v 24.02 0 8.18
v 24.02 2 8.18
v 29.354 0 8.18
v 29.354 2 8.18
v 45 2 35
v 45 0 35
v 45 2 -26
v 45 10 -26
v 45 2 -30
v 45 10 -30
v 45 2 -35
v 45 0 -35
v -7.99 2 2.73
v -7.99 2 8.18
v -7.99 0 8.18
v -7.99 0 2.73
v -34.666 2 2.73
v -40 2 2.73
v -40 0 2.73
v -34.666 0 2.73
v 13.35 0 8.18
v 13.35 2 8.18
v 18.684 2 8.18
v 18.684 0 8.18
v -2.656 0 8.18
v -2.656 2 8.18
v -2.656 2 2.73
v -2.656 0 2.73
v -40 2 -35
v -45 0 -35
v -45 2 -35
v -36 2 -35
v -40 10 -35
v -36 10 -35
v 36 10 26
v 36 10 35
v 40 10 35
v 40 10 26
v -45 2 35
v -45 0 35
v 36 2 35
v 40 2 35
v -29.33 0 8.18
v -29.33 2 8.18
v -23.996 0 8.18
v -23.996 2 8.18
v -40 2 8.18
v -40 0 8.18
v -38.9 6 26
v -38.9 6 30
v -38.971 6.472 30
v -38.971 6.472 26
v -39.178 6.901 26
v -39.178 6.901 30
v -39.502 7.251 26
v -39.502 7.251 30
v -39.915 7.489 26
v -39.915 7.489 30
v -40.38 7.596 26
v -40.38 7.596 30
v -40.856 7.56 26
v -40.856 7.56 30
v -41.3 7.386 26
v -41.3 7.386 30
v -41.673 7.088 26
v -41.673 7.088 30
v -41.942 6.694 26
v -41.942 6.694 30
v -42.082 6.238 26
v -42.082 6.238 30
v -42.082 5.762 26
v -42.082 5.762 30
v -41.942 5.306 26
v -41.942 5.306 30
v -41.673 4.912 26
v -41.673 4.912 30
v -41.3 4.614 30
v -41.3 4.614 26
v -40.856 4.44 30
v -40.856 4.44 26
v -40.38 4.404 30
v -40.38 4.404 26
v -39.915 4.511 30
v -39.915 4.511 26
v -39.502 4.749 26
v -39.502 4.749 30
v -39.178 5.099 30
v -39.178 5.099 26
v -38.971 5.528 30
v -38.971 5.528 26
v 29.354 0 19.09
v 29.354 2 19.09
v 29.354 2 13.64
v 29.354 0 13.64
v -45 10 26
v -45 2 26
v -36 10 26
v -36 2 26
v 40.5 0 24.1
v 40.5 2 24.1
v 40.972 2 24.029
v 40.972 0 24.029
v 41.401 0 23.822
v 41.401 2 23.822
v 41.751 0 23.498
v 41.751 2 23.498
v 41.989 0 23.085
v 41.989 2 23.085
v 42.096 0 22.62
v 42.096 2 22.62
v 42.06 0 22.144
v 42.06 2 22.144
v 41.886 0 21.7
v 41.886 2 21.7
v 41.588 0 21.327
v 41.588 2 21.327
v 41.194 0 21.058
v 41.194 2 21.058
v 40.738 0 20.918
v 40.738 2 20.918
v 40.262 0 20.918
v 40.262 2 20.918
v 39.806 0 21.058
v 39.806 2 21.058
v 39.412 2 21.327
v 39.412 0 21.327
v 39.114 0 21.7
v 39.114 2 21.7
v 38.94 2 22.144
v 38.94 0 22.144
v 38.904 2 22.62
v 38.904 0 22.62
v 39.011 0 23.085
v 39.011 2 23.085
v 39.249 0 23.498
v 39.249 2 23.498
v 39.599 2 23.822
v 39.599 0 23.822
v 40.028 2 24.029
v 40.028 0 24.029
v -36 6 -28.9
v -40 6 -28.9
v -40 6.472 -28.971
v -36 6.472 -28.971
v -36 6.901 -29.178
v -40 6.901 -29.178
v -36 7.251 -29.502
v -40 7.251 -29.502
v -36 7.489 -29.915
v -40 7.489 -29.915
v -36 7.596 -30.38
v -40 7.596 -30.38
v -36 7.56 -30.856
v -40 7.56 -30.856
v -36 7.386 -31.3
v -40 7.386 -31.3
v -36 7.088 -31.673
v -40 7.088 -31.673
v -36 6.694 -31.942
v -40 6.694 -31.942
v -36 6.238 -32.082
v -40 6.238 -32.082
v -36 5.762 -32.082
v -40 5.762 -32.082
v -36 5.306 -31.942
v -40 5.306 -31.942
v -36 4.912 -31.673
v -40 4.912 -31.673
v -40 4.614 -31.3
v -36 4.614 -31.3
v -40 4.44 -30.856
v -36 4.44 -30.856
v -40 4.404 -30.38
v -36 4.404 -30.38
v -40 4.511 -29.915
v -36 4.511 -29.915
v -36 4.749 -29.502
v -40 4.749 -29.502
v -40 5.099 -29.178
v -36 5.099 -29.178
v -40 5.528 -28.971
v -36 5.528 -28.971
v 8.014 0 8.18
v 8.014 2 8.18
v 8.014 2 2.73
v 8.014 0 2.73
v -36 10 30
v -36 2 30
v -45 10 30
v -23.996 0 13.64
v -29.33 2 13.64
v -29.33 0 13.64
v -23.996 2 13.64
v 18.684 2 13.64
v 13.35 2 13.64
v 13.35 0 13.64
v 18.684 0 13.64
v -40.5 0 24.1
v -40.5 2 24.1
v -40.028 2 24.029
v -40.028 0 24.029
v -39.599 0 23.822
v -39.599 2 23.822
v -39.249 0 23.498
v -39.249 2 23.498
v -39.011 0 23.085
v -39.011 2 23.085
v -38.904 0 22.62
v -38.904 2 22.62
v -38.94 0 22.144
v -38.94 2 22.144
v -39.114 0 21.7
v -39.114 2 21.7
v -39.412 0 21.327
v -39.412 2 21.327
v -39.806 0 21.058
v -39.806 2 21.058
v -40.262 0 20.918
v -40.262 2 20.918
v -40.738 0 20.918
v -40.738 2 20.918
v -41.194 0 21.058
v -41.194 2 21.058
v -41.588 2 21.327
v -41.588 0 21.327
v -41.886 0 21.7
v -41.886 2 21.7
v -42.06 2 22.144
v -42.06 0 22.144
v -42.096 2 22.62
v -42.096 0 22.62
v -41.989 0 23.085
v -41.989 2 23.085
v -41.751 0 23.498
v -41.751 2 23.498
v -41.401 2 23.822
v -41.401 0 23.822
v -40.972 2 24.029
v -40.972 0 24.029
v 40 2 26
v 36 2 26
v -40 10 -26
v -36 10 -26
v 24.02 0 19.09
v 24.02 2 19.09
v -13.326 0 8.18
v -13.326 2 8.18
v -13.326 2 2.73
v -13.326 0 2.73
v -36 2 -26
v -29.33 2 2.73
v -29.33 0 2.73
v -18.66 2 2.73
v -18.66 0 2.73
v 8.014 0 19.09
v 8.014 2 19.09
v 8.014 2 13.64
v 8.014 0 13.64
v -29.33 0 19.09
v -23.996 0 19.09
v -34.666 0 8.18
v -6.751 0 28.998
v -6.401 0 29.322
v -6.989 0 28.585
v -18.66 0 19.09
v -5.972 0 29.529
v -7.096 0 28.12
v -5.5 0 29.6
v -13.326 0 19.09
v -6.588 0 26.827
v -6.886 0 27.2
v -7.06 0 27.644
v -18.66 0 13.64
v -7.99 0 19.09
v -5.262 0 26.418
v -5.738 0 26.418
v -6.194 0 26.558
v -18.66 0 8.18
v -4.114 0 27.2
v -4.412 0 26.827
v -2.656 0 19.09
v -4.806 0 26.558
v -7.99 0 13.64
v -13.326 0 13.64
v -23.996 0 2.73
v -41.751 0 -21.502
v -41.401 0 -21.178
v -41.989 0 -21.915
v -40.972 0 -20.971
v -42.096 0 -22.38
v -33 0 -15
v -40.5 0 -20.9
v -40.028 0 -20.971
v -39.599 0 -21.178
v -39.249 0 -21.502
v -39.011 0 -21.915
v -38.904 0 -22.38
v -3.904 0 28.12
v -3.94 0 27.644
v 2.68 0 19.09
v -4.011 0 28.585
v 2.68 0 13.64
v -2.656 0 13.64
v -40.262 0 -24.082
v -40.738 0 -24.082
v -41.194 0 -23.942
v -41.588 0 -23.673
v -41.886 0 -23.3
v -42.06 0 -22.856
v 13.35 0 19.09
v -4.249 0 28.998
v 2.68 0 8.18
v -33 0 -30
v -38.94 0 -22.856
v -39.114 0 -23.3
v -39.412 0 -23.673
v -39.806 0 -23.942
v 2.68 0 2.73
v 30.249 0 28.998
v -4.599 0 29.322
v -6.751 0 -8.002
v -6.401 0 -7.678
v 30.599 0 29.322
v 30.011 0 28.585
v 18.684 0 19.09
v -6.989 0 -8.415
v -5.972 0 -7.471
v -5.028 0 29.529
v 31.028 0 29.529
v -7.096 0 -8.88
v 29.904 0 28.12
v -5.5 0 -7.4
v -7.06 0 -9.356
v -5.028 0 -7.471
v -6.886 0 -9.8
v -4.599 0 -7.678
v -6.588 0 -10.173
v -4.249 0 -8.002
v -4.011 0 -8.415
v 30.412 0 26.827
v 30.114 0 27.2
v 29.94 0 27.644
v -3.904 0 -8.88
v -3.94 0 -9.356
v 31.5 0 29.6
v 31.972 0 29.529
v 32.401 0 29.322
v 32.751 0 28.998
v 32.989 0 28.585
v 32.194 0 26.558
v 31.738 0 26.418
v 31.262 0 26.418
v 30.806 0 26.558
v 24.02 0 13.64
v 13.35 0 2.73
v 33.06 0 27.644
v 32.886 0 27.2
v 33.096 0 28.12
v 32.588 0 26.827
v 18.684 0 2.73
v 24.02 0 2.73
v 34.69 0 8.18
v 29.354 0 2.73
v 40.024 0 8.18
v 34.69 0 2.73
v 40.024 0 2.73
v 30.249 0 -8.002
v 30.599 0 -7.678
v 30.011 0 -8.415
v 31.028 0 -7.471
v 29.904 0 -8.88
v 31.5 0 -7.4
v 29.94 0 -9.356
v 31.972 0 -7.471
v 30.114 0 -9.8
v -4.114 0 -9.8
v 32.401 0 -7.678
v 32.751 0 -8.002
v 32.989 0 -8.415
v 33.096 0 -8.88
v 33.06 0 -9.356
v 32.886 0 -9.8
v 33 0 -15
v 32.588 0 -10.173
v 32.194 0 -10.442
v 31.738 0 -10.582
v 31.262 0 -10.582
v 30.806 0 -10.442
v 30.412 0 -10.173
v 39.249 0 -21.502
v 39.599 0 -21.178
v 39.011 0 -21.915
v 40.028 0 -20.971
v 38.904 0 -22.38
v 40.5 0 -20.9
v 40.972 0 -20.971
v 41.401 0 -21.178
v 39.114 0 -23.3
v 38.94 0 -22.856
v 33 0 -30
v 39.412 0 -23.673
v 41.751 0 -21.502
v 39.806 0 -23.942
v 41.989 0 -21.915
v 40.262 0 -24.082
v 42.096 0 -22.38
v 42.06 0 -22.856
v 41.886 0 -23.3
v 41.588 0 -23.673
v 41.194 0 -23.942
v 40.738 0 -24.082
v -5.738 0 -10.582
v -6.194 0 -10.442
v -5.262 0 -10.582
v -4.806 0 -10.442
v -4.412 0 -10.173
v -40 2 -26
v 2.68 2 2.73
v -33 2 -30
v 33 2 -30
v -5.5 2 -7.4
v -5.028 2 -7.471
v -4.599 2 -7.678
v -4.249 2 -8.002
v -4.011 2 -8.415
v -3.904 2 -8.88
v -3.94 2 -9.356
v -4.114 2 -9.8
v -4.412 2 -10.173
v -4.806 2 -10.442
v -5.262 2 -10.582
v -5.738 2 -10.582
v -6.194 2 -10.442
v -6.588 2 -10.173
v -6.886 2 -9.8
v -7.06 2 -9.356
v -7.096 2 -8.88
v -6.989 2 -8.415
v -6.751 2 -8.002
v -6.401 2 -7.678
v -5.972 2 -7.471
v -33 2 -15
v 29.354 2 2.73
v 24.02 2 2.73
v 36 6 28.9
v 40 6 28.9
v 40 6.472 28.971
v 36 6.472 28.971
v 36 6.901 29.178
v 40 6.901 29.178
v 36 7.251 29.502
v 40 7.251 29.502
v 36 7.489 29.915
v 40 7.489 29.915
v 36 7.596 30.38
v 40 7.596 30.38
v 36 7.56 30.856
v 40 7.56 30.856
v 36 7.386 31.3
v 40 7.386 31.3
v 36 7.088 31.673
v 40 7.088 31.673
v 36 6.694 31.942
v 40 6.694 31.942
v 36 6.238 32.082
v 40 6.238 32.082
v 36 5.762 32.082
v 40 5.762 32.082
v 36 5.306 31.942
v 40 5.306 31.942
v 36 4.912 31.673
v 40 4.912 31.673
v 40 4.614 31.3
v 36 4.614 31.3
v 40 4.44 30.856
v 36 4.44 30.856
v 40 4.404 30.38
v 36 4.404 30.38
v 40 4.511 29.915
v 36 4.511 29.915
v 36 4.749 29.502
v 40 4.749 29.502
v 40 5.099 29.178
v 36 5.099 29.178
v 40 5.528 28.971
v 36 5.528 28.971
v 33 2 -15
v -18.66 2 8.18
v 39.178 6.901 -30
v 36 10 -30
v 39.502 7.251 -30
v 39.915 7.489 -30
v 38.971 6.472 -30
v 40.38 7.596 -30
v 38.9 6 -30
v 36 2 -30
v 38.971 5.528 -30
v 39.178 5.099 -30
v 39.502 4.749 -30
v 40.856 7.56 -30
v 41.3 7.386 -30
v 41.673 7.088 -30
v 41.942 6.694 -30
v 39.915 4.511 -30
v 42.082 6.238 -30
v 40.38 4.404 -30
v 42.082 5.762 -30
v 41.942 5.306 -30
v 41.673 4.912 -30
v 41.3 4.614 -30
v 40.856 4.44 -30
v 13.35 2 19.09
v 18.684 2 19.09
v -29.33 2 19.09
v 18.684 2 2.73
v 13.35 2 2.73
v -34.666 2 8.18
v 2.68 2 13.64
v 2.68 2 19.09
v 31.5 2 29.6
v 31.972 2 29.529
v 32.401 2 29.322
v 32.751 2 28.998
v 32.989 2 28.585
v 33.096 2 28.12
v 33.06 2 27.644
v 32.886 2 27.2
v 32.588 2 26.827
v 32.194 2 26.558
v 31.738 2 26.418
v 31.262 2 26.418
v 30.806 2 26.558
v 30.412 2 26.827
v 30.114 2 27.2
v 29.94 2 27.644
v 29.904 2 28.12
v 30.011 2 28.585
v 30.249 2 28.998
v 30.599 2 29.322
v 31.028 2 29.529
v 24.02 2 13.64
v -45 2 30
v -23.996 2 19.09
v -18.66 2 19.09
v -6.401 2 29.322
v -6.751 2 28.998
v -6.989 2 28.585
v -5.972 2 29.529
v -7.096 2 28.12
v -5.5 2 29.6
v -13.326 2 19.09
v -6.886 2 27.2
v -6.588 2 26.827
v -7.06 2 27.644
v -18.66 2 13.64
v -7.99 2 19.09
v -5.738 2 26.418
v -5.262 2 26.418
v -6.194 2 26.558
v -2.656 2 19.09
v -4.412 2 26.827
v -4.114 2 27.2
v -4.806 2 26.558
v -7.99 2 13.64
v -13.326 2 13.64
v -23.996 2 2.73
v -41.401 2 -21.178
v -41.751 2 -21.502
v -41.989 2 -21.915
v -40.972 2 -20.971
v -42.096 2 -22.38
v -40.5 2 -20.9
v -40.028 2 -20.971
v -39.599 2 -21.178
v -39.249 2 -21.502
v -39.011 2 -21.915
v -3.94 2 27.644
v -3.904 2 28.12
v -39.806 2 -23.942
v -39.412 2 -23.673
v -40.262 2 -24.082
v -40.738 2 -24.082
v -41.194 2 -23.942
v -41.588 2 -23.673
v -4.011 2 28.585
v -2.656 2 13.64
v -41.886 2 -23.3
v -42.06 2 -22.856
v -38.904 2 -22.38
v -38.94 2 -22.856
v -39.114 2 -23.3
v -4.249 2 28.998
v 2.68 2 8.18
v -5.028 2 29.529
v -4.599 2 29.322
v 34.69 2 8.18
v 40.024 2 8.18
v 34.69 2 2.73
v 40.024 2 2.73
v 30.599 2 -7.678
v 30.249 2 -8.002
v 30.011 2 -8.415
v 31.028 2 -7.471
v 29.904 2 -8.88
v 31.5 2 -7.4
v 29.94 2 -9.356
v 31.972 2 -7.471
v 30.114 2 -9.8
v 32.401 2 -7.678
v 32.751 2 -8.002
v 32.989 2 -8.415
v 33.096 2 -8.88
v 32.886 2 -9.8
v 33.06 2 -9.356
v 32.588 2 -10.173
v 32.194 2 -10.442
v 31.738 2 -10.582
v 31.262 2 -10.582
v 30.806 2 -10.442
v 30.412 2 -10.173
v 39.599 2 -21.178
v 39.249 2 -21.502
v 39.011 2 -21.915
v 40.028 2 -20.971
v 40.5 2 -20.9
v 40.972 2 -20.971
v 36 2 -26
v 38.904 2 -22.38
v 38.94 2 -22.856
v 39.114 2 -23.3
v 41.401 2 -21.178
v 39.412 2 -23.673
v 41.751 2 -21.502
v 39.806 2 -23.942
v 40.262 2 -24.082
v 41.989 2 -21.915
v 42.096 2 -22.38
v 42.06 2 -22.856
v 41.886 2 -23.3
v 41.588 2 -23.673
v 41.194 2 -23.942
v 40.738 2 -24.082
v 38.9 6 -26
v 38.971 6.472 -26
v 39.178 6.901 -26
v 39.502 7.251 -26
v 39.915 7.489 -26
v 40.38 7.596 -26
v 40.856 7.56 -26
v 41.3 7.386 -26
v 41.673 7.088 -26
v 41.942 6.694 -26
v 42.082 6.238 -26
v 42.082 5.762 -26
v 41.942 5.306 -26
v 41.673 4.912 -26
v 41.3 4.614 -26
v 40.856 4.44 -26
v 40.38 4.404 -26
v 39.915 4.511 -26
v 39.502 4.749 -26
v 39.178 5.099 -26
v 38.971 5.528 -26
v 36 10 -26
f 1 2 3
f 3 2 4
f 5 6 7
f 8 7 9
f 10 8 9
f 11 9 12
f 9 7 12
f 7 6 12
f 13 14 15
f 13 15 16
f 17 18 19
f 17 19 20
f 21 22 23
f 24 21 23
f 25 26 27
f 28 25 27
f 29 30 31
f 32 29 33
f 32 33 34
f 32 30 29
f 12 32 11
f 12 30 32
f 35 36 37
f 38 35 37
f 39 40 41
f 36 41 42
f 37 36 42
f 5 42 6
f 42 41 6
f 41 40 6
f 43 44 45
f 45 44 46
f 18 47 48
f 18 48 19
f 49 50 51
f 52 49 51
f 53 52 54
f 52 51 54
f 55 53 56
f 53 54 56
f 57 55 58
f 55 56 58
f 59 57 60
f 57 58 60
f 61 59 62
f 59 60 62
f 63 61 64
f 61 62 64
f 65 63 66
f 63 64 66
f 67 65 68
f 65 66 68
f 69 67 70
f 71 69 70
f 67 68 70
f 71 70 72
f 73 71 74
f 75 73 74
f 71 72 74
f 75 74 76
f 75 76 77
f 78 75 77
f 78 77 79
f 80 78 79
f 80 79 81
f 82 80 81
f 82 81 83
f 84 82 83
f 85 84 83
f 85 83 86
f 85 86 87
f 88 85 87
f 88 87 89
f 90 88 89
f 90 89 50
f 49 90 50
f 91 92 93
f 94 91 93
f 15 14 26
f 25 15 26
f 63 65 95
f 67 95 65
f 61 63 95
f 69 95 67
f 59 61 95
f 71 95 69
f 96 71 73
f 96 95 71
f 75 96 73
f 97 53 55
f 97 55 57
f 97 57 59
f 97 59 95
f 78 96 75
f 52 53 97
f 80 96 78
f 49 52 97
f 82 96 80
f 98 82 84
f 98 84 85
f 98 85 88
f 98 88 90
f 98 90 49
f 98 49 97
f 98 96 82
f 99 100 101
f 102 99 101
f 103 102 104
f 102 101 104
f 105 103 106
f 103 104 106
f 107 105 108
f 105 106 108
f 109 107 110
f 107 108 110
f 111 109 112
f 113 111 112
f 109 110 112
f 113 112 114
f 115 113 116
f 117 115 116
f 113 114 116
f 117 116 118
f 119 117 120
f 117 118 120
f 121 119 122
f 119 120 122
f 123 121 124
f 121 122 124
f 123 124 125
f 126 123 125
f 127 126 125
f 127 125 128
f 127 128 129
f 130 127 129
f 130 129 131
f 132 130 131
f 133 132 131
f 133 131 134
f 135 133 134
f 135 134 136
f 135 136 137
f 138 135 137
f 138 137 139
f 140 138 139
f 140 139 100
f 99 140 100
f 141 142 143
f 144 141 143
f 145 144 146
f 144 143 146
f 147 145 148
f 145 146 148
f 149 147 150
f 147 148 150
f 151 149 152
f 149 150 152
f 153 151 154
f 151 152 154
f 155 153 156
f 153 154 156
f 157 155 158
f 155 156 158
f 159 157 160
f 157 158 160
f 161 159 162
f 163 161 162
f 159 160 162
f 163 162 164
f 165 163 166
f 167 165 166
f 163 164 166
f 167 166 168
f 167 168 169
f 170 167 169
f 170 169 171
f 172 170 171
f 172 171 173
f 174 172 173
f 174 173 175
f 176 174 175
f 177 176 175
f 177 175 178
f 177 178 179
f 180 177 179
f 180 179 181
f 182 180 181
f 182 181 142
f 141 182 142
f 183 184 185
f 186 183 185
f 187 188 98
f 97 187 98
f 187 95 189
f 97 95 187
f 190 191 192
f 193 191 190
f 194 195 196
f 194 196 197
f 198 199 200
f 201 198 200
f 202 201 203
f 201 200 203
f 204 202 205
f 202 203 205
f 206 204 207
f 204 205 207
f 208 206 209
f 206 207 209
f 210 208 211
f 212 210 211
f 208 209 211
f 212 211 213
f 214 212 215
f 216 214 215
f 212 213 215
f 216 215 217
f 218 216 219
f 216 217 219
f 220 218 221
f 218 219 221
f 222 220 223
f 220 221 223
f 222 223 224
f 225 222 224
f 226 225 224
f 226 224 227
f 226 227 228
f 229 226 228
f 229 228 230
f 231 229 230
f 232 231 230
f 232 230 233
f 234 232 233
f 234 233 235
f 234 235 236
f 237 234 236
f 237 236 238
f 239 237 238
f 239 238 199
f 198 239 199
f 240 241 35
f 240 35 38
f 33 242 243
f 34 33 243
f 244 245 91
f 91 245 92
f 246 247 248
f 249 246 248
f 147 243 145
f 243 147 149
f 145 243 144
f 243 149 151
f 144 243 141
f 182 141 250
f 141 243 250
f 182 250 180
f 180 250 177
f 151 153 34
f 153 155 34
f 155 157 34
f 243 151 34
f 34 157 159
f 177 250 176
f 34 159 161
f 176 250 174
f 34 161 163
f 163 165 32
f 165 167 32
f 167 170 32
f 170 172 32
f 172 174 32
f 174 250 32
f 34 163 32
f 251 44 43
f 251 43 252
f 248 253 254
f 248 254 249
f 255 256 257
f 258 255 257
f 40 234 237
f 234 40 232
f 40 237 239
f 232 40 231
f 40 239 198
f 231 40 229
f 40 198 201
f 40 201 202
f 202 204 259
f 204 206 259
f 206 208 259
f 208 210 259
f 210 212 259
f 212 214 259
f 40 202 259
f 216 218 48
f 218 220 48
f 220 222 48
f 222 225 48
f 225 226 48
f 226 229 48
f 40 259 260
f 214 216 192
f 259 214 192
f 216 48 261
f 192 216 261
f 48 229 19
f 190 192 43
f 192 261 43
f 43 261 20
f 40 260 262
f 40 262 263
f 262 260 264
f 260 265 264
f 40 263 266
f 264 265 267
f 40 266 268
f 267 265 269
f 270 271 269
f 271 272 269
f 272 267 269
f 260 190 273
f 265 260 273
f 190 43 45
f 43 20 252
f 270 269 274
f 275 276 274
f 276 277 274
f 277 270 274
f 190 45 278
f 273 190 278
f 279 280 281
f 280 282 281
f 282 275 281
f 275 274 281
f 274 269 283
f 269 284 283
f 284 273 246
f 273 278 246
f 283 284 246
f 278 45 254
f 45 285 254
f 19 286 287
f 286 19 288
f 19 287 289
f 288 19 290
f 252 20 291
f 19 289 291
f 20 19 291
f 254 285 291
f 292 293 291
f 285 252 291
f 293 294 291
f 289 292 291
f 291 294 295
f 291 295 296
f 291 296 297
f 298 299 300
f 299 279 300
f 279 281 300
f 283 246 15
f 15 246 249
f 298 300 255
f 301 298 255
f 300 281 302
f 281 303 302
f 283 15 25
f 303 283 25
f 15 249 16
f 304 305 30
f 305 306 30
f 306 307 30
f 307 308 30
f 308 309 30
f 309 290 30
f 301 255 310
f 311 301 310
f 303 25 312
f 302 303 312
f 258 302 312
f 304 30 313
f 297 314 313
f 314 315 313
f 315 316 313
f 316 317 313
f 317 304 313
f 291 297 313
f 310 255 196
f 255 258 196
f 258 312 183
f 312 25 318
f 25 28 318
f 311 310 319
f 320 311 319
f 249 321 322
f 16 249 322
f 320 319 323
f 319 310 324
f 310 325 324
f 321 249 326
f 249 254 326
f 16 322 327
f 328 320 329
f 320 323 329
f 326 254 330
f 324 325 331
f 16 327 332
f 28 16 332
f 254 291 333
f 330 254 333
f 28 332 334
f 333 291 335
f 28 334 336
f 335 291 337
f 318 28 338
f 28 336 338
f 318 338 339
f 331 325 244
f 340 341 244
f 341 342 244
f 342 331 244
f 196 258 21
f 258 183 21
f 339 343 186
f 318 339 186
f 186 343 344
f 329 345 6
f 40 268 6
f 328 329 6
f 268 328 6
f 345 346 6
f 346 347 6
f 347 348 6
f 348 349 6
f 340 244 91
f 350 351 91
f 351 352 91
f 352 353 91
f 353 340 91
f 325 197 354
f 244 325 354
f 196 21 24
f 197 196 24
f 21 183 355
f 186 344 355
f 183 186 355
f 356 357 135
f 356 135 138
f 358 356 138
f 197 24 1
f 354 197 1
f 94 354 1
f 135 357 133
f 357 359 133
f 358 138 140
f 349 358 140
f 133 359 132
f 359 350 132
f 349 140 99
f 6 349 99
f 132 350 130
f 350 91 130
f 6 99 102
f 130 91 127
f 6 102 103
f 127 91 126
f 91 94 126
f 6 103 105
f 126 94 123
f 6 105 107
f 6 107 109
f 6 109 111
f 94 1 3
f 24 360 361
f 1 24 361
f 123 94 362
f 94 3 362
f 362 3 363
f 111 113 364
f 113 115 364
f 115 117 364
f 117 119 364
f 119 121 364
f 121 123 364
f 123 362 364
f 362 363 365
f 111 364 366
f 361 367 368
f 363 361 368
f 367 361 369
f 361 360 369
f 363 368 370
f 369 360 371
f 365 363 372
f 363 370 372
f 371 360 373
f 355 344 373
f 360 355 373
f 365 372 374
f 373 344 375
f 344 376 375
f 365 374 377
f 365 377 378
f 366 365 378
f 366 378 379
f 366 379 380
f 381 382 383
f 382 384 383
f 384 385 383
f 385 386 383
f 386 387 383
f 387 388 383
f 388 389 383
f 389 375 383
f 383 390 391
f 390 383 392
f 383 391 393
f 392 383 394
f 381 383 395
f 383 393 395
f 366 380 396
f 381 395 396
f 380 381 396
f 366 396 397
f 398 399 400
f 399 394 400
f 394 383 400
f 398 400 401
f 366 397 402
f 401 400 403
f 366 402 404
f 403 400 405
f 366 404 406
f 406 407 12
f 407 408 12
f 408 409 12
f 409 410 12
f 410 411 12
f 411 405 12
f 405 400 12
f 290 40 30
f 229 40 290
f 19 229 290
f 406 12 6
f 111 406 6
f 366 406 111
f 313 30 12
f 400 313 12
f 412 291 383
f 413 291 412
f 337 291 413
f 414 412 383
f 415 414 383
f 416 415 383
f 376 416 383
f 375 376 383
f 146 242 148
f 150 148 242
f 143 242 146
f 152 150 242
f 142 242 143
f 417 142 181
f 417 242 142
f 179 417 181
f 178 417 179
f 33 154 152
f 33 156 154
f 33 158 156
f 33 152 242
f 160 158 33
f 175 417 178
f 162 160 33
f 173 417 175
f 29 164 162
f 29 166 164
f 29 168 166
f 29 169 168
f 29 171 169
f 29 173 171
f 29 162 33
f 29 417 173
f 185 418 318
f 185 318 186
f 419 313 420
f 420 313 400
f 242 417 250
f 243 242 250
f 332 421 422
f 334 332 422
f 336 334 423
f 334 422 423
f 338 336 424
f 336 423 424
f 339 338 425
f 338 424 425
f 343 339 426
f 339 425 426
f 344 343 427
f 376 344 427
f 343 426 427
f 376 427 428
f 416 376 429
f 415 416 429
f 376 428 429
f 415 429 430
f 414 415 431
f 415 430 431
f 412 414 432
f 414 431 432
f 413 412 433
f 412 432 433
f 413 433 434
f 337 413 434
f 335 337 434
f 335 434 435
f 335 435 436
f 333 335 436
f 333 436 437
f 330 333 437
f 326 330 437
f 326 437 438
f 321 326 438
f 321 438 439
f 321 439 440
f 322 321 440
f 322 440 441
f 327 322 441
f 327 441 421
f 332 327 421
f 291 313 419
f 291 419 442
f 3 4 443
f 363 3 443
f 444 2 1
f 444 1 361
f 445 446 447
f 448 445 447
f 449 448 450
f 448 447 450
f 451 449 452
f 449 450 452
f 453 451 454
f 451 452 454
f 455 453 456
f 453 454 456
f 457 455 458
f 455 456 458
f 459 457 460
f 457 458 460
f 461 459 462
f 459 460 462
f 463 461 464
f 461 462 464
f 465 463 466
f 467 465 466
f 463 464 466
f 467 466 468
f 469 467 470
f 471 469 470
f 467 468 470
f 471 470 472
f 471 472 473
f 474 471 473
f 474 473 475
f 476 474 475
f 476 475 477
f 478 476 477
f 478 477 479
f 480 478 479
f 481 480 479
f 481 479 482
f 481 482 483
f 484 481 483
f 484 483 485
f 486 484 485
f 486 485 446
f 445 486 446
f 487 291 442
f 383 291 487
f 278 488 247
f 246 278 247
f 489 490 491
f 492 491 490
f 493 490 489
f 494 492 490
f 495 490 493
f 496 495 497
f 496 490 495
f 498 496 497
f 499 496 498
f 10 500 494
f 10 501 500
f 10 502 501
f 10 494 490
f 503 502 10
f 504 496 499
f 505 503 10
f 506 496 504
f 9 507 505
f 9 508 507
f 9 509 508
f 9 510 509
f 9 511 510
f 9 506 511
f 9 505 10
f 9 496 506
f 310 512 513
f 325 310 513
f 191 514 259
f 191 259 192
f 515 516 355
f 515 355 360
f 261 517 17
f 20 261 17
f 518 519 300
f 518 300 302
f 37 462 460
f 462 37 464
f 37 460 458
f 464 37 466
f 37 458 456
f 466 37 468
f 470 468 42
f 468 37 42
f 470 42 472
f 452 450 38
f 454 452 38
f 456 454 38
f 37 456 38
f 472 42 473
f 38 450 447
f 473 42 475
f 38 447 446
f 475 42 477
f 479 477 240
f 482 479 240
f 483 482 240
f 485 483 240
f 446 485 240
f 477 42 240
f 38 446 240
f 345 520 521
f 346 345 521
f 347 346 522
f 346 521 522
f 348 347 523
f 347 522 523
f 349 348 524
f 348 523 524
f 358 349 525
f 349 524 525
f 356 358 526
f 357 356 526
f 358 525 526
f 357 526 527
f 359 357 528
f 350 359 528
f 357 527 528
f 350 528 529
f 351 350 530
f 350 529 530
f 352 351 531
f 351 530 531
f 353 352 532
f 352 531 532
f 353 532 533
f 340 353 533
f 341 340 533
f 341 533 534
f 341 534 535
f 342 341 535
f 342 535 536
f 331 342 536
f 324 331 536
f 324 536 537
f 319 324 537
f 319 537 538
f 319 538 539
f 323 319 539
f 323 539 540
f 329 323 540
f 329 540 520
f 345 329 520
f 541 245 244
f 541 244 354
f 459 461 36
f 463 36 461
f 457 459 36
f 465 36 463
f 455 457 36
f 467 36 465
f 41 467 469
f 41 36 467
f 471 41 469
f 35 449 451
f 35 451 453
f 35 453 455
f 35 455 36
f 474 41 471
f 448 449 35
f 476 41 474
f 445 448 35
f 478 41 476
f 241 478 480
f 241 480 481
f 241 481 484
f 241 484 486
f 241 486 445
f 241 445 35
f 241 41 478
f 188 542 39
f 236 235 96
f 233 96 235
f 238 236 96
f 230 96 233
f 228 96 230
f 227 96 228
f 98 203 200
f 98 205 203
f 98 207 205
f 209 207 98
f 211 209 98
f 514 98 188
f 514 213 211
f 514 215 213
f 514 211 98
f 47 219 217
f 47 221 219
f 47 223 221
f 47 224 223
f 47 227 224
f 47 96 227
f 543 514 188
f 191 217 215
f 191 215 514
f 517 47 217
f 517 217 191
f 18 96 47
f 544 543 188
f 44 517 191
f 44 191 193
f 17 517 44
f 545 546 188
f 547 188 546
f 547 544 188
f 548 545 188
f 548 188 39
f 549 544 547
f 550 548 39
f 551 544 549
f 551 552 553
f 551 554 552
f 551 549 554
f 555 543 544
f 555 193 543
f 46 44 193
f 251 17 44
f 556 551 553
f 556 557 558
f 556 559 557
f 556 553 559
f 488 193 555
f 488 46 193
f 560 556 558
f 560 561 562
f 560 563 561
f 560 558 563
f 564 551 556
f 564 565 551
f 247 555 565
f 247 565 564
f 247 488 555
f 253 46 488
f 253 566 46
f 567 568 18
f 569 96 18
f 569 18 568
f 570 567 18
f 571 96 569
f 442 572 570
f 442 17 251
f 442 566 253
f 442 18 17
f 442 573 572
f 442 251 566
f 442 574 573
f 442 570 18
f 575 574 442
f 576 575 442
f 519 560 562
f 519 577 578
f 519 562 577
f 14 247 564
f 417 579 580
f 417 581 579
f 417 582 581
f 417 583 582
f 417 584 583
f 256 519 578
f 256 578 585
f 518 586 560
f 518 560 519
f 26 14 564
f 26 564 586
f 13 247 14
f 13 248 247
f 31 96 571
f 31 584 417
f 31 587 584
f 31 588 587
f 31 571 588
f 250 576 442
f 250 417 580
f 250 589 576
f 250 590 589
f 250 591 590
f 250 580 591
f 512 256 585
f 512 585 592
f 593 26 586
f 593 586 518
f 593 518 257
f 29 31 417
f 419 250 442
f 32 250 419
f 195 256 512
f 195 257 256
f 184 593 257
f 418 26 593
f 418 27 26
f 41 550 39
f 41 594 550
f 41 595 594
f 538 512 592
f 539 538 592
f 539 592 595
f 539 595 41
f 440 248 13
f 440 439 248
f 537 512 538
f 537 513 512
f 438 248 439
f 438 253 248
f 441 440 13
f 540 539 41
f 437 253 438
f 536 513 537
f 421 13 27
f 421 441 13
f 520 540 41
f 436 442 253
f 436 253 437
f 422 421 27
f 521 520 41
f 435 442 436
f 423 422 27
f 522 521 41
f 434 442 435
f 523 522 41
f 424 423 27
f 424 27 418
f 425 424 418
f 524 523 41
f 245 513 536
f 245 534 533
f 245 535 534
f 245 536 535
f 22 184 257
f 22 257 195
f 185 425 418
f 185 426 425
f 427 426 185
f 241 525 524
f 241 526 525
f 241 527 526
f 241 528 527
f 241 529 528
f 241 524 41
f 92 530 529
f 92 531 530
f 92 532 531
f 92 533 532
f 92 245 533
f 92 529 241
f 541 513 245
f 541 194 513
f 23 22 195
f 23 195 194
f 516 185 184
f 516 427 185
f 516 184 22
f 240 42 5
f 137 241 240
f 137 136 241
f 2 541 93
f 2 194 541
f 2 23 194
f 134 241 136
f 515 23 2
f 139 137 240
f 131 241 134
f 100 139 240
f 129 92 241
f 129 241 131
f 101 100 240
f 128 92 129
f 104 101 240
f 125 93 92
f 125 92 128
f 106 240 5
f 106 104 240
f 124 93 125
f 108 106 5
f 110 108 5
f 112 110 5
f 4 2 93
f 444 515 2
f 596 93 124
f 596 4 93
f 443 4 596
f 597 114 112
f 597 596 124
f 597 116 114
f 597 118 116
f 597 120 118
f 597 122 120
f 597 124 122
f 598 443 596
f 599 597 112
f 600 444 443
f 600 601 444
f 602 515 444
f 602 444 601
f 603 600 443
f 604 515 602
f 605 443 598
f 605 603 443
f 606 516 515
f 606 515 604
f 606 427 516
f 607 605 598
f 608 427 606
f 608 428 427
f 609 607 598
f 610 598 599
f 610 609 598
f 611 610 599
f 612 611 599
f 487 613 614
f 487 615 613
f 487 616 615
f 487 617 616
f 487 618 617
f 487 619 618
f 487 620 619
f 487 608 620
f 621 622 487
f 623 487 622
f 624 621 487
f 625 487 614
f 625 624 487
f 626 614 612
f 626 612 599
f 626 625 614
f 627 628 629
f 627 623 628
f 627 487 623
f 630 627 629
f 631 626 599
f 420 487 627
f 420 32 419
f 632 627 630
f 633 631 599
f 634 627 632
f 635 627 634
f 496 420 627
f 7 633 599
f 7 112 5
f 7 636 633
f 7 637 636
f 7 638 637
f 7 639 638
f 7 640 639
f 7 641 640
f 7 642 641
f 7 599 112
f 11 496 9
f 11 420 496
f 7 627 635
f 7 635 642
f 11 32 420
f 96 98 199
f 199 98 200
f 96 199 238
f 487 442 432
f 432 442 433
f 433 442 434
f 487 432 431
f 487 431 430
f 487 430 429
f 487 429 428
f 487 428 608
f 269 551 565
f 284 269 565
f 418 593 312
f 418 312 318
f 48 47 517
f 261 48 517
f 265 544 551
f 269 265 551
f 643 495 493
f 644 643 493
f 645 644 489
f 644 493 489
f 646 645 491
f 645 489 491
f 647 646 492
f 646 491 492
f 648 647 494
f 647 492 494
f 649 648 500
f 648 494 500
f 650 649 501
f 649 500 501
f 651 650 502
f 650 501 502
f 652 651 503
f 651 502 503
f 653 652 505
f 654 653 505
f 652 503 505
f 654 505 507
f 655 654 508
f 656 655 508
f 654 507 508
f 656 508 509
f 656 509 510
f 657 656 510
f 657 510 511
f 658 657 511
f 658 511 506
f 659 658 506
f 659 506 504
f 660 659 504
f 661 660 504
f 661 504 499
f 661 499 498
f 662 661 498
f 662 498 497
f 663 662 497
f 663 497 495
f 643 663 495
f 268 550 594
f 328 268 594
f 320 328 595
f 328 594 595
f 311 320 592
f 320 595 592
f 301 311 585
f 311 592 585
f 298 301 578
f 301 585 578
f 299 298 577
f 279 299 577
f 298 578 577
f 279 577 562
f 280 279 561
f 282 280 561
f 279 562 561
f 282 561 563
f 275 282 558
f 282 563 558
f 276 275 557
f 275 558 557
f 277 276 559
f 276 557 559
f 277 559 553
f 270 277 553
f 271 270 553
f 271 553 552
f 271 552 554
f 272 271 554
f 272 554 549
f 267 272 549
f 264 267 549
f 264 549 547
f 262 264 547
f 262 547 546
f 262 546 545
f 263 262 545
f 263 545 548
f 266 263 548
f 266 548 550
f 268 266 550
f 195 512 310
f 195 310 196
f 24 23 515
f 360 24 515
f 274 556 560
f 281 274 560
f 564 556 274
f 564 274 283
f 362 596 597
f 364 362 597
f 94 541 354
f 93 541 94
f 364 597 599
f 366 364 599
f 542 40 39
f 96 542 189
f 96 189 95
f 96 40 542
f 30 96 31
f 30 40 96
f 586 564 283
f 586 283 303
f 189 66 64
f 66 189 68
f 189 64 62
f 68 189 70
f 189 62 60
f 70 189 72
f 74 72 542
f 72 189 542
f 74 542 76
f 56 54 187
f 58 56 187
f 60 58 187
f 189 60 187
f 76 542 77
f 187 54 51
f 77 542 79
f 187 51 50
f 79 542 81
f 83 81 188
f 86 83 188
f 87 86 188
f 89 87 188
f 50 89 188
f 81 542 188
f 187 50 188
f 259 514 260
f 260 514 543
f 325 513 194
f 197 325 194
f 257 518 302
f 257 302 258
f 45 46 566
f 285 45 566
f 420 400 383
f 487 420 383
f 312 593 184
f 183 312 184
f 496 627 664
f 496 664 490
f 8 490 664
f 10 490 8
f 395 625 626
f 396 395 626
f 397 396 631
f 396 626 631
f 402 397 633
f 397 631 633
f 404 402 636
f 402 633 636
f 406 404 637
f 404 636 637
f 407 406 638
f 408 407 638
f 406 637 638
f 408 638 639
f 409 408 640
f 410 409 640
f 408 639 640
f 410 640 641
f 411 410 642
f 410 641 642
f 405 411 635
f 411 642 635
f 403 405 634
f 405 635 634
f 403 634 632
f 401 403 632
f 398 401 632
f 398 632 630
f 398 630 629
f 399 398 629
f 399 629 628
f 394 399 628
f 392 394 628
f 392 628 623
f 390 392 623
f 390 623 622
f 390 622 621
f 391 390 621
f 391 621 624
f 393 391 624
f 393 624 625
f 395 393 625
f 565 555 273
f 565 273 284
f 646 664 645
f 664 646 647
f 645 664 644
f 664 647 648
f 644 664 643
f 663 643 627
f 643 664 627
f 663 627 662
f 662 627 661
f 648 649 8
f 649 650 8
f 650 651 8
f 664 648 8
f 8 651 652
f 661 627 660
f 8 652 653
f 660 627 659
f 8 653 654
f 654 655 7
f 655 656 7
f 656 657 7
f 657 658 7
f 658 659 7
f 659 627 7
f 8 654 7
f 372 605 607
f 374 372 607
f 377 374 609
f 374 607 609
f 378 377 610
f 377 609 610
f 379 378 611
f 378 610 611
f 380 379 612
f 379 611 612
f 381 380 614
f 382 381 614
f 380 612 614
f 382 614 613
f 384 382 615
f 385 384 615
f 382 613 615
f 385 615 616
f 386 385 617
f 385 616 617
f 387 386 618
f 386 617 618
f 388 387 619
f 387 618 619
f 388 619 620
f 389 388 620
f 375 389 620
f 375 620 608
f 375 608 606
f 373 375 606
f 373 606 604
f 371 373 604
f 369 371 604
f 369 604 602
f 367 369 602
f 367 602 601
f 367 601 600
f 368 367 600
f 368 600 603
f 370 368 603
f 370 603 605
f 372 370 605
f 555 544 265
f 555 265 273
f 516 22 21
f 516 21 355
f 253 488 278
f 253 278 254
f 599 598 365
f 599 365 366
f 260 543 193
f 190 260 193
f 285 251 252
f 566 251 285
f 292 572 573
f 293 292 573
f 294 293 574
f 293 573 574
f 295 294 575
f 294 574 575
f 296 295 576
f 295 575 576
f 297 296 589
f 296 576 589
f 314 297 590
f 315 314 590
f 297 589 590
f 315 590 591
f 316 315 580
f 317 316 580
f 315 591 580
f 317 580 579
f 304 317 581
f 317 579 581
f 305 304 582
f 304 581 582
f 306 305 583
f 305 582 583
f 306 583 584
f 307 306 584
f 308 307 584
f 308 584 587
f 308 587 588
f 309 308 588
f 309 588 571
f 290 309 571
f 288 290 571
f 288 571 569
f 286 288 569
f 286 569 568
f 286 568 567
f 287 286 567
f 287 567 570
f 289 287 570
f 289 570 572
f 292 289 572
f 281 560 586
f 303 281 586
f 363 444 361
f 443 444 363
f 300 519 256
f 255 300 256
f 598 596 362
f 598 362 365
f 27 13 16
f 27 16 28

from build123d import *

# Parameters (mm, degrees)
ESBO_O1_W                = 90
ESBO_O1_H                = 70
RESSALTO_EXTRUS_O1_DEPTH = 2
ESBO_O3_W                = 4
ESBO_O3_H                = 9
ESBO_O3_W_2              = 9
ESBO_O3_H_2              = 4
RESSALTO_EXTRUS_O4_DEPTH = 8
ESBO_O6_W                = 66
ESBO_O6_H                = 15
CORTE_EXTRUS_O4_DEPTH    = 3
ESBO_O7_R                = 1.6
CORTE_EXTRUS_O7_DEPTH    = 3
ESBO_O8_R                = 1.6
CORTE_EXTRUS_O8_DEPTH    = 5
ESBO_O9_R                = 1.6
CORTE_EXTRUS_O9_DEPTH    = 5
ESBO_O10_R               = 1.6
CORTE_EXTRUS_O10_DEPTH   = 5
ESBO_O11_R               = 1.6
CORTE_EXTRUS_O11_DEPTH   = 5
ESBO_O12_R               = 1.6
CORTE_EXTRUS_O12_DEPTH   = 58.567351858
ESBO_O2_W                = 5.334
ESBO_O2_H                = 5.45
CORTE_EXTRUS_O13_DEPTH   = 58.567351858


with BuildPart() as part:
    # Esboço1 → Ressalto-extrusão1 (new body)
    with BuildSketch(Plane(origin=(0, 0, 0), x_dir=(1, 0, 0), z_dir=(0, 1, 0))):
        Rectangle(ESBO_O1_W, ESBO_O1_H)
    extrude(amount=RESSALTO_EXTRUS_O1_DEPTH)

    # Esboço3 → Ressalto-extrusão4 (add)
    with BuildSketch(Plane(origin=(0, 2, 0), x_dir=(1, 0, 0), z_dir=(0, 1, 0))):
        with Locations((-38, 30.5)):
            Rectangle(ESBO_O3_W, ESBO_O3_H)
        with Locations((40.5, 28)):
            Rectangle(ESBO_O3_W_2, ESBO_O3_H_2)
        with Locations((38, -30.5)):
            Rectangle(ESBO_O3_W, ESBO_O3_H)
        with Locations((-40.5, -28)):
            Rectangle(ESBO_O3_W_2, ESBO_O3_H_2)
    extrude(amount=RESSALTO_EXTRUS_O4_DEPTH)

    # Esboço6 → Corte-extrusão4 (cut)
    with BuildSketch(Plane.XZ):
        with Locations((0, -22.5)):
            Rectangle(ESBO_O6_W, ESBO_O6_H)
    extrude(amount=-CORTE_EXTRUS_O4_DEPTH, mode=Mode.SUBTRACT)

    # Esboço7 → Corte-extrusão7 (cut)
    with BuildSketch(Plane(origin=(0, 2, 0), x_dir=(1, 0, 0), z_dir=(0, 1, 0))):
        with Locations(Location((31.5, 9, 0), (0, 0, 270))):
            Circle(ESBO_O7_R)
        with Locations(Location((-5.5, 9, 0), (0, 0, 270))):
            Circle(ESBO_O7_R)
        with Locations(Location((-5.5, -28, 0), (0, 0, 270))):
            Circle(ESBO_O7_R)
        with Locations(Location((31.5, -28, 0), (0, 0, 270))):
            Circle(ESBO_O7_R)
    extrude(amount=-CORTE_EXTRUS_O7_DEPTH, mode=Mode.SUBTRACT)

    # Esboço8 → Corte-extrusão8 (cut)
    with BuildSketch(Plane(origin=(0, 0, -30), x_dir=(-1, 0, 0), z_dir=(0, 0, -1))):
        with Locations((-40.5, 6)):
            Circle(ESBO_O8_R)
    extrude(amount=-CORTE_EXTRUS_O8_DEPTH, mode=Mode.SUBTRACT)

    # Esboço9 → Corte-extrusão9 (cut)
    with BuildSketch(Plane.ZY.offset(40)):
        with Locations((-30.5, 6)):
            Circle(ESBO_O9_R)
    extrude(amount=-CORTE_EXTRUS_O9_DEPTH, mode=Mode.SUBTRACT)

    # Esboço10 → Corte-extrusão10 (cut)
    with BuildSketch(Plane.XY.offset(30)):
        with Locations((-40.5, 6)):
            Circle(ESBO_O10_R)
    extrude(amount=-CORTE_EXTRUS_O10_DEPTH, mode=Mode.SUBTRACT)

    # Esboço11 → Corte-extrusão11 (cut)
    with BuildSketch(Plane(origin=(40, 0, 0), x_dir=(0, 0, -1), z_dir=(1, 0, 0))):
        with Locations((-30.5, 6)):
            Circle(ESBO_O11_R)
    extrude(amount=-CORTE_EXTRUS_O11_DEPTH, mode=Mode.SUBTRACT)

    # Esboço12 → Corte-extrusão12 (cut, through all)
    with BuildSketch(Plane(origin=(0, 2, 0), x_dir=(1, 0, 0), z_dir=(0, 1, 0))):
        with Locations(Location((-40.5, 22.5, 0), (0, 0, 270))):
            Circle(ESBO_O12_R)
        with Locations(Location((-40.5, -22.5, 0), (0, 0, 270))):
            Circle(ESBO_O12_R)
        with Locations(Location((40.5, -22.5, 0), (0, 0, 270))):
            Circle(ESBO_O12_R)
        with Locations(Location((40.5, 22.5, 0), (0, 0, 270))):
            Circle(ESBO_O12_R)
    extrude(amount=-CORTE_EXTRUS_O12_DEPTH, mode=Mode.SUBTRACT)

    # Esboço2 → Corte-extrusão13 (cut, through all)
    with BuildSketch(Plane(origin=(0, 2, 0), x_dir=(1, 0, 0), z_dir=(0, 1, 0))):
        with Locations((-26.663, -5.455)):
            Rectangle(ESBO_O2_W, ESBO_O2_H)
        with Locations((-15.993, -5.455)):
            Rectangle(ESBO_O2_W, ESBO_O2_H)
        with Locations((-5.323, -5.455)):
            Rectangle(ESBO_O2_W, ESBO_O2_H)
        with Locations((5.347, -5.455)):
            Rectangle(ESBO_O2_W, ESBO_O2_H)
        with Locations((16.017, -5.455)):
            Rectangle(ESBO_O2_W, ESBO_O2_H)
        with Locations((26.687, -5.455)):
            Rectangle(ESBO_O2_W, ESBO_O2_H)
        with Locations((37.357, -5.455)):
            Rectangle(ESBO_O2_W, ESBO_O2_H)
        with Locations((-26.663, -16.365)):
            Rectangle(ESBO_O2_W, ESBO_O2_H)
        with Locations((-15.993, -16.365)):
            Rectangle(ESBO_O2_W, ESBO_O2_H)
        with Locations((-5.323, -16.365)):
            Rectangle(ESBO_O2_W, ESBO_O2_H)
        with Locations((5.347, -16.365)):
            Rectangle(ESBO_O2_W, ESBO_O2_H)
        with Locations((16.017, -16.365)):
            Rectangle(ESBO_O2_W, ESBO_O2_H)
        with Locations((26.687, -16.365)):
            Rectangle(ESBO_O2_W, ESBO_O2_H)
        with Locations((-37.333, -5.455)):
            Rectangle(ESBO_O2_W, ESBO_O2_H)
    extrude(amount=-CORTE_EXTRUS_O13_DEPTH, mode=Mode.SUBTRACT)


solid = part.part
